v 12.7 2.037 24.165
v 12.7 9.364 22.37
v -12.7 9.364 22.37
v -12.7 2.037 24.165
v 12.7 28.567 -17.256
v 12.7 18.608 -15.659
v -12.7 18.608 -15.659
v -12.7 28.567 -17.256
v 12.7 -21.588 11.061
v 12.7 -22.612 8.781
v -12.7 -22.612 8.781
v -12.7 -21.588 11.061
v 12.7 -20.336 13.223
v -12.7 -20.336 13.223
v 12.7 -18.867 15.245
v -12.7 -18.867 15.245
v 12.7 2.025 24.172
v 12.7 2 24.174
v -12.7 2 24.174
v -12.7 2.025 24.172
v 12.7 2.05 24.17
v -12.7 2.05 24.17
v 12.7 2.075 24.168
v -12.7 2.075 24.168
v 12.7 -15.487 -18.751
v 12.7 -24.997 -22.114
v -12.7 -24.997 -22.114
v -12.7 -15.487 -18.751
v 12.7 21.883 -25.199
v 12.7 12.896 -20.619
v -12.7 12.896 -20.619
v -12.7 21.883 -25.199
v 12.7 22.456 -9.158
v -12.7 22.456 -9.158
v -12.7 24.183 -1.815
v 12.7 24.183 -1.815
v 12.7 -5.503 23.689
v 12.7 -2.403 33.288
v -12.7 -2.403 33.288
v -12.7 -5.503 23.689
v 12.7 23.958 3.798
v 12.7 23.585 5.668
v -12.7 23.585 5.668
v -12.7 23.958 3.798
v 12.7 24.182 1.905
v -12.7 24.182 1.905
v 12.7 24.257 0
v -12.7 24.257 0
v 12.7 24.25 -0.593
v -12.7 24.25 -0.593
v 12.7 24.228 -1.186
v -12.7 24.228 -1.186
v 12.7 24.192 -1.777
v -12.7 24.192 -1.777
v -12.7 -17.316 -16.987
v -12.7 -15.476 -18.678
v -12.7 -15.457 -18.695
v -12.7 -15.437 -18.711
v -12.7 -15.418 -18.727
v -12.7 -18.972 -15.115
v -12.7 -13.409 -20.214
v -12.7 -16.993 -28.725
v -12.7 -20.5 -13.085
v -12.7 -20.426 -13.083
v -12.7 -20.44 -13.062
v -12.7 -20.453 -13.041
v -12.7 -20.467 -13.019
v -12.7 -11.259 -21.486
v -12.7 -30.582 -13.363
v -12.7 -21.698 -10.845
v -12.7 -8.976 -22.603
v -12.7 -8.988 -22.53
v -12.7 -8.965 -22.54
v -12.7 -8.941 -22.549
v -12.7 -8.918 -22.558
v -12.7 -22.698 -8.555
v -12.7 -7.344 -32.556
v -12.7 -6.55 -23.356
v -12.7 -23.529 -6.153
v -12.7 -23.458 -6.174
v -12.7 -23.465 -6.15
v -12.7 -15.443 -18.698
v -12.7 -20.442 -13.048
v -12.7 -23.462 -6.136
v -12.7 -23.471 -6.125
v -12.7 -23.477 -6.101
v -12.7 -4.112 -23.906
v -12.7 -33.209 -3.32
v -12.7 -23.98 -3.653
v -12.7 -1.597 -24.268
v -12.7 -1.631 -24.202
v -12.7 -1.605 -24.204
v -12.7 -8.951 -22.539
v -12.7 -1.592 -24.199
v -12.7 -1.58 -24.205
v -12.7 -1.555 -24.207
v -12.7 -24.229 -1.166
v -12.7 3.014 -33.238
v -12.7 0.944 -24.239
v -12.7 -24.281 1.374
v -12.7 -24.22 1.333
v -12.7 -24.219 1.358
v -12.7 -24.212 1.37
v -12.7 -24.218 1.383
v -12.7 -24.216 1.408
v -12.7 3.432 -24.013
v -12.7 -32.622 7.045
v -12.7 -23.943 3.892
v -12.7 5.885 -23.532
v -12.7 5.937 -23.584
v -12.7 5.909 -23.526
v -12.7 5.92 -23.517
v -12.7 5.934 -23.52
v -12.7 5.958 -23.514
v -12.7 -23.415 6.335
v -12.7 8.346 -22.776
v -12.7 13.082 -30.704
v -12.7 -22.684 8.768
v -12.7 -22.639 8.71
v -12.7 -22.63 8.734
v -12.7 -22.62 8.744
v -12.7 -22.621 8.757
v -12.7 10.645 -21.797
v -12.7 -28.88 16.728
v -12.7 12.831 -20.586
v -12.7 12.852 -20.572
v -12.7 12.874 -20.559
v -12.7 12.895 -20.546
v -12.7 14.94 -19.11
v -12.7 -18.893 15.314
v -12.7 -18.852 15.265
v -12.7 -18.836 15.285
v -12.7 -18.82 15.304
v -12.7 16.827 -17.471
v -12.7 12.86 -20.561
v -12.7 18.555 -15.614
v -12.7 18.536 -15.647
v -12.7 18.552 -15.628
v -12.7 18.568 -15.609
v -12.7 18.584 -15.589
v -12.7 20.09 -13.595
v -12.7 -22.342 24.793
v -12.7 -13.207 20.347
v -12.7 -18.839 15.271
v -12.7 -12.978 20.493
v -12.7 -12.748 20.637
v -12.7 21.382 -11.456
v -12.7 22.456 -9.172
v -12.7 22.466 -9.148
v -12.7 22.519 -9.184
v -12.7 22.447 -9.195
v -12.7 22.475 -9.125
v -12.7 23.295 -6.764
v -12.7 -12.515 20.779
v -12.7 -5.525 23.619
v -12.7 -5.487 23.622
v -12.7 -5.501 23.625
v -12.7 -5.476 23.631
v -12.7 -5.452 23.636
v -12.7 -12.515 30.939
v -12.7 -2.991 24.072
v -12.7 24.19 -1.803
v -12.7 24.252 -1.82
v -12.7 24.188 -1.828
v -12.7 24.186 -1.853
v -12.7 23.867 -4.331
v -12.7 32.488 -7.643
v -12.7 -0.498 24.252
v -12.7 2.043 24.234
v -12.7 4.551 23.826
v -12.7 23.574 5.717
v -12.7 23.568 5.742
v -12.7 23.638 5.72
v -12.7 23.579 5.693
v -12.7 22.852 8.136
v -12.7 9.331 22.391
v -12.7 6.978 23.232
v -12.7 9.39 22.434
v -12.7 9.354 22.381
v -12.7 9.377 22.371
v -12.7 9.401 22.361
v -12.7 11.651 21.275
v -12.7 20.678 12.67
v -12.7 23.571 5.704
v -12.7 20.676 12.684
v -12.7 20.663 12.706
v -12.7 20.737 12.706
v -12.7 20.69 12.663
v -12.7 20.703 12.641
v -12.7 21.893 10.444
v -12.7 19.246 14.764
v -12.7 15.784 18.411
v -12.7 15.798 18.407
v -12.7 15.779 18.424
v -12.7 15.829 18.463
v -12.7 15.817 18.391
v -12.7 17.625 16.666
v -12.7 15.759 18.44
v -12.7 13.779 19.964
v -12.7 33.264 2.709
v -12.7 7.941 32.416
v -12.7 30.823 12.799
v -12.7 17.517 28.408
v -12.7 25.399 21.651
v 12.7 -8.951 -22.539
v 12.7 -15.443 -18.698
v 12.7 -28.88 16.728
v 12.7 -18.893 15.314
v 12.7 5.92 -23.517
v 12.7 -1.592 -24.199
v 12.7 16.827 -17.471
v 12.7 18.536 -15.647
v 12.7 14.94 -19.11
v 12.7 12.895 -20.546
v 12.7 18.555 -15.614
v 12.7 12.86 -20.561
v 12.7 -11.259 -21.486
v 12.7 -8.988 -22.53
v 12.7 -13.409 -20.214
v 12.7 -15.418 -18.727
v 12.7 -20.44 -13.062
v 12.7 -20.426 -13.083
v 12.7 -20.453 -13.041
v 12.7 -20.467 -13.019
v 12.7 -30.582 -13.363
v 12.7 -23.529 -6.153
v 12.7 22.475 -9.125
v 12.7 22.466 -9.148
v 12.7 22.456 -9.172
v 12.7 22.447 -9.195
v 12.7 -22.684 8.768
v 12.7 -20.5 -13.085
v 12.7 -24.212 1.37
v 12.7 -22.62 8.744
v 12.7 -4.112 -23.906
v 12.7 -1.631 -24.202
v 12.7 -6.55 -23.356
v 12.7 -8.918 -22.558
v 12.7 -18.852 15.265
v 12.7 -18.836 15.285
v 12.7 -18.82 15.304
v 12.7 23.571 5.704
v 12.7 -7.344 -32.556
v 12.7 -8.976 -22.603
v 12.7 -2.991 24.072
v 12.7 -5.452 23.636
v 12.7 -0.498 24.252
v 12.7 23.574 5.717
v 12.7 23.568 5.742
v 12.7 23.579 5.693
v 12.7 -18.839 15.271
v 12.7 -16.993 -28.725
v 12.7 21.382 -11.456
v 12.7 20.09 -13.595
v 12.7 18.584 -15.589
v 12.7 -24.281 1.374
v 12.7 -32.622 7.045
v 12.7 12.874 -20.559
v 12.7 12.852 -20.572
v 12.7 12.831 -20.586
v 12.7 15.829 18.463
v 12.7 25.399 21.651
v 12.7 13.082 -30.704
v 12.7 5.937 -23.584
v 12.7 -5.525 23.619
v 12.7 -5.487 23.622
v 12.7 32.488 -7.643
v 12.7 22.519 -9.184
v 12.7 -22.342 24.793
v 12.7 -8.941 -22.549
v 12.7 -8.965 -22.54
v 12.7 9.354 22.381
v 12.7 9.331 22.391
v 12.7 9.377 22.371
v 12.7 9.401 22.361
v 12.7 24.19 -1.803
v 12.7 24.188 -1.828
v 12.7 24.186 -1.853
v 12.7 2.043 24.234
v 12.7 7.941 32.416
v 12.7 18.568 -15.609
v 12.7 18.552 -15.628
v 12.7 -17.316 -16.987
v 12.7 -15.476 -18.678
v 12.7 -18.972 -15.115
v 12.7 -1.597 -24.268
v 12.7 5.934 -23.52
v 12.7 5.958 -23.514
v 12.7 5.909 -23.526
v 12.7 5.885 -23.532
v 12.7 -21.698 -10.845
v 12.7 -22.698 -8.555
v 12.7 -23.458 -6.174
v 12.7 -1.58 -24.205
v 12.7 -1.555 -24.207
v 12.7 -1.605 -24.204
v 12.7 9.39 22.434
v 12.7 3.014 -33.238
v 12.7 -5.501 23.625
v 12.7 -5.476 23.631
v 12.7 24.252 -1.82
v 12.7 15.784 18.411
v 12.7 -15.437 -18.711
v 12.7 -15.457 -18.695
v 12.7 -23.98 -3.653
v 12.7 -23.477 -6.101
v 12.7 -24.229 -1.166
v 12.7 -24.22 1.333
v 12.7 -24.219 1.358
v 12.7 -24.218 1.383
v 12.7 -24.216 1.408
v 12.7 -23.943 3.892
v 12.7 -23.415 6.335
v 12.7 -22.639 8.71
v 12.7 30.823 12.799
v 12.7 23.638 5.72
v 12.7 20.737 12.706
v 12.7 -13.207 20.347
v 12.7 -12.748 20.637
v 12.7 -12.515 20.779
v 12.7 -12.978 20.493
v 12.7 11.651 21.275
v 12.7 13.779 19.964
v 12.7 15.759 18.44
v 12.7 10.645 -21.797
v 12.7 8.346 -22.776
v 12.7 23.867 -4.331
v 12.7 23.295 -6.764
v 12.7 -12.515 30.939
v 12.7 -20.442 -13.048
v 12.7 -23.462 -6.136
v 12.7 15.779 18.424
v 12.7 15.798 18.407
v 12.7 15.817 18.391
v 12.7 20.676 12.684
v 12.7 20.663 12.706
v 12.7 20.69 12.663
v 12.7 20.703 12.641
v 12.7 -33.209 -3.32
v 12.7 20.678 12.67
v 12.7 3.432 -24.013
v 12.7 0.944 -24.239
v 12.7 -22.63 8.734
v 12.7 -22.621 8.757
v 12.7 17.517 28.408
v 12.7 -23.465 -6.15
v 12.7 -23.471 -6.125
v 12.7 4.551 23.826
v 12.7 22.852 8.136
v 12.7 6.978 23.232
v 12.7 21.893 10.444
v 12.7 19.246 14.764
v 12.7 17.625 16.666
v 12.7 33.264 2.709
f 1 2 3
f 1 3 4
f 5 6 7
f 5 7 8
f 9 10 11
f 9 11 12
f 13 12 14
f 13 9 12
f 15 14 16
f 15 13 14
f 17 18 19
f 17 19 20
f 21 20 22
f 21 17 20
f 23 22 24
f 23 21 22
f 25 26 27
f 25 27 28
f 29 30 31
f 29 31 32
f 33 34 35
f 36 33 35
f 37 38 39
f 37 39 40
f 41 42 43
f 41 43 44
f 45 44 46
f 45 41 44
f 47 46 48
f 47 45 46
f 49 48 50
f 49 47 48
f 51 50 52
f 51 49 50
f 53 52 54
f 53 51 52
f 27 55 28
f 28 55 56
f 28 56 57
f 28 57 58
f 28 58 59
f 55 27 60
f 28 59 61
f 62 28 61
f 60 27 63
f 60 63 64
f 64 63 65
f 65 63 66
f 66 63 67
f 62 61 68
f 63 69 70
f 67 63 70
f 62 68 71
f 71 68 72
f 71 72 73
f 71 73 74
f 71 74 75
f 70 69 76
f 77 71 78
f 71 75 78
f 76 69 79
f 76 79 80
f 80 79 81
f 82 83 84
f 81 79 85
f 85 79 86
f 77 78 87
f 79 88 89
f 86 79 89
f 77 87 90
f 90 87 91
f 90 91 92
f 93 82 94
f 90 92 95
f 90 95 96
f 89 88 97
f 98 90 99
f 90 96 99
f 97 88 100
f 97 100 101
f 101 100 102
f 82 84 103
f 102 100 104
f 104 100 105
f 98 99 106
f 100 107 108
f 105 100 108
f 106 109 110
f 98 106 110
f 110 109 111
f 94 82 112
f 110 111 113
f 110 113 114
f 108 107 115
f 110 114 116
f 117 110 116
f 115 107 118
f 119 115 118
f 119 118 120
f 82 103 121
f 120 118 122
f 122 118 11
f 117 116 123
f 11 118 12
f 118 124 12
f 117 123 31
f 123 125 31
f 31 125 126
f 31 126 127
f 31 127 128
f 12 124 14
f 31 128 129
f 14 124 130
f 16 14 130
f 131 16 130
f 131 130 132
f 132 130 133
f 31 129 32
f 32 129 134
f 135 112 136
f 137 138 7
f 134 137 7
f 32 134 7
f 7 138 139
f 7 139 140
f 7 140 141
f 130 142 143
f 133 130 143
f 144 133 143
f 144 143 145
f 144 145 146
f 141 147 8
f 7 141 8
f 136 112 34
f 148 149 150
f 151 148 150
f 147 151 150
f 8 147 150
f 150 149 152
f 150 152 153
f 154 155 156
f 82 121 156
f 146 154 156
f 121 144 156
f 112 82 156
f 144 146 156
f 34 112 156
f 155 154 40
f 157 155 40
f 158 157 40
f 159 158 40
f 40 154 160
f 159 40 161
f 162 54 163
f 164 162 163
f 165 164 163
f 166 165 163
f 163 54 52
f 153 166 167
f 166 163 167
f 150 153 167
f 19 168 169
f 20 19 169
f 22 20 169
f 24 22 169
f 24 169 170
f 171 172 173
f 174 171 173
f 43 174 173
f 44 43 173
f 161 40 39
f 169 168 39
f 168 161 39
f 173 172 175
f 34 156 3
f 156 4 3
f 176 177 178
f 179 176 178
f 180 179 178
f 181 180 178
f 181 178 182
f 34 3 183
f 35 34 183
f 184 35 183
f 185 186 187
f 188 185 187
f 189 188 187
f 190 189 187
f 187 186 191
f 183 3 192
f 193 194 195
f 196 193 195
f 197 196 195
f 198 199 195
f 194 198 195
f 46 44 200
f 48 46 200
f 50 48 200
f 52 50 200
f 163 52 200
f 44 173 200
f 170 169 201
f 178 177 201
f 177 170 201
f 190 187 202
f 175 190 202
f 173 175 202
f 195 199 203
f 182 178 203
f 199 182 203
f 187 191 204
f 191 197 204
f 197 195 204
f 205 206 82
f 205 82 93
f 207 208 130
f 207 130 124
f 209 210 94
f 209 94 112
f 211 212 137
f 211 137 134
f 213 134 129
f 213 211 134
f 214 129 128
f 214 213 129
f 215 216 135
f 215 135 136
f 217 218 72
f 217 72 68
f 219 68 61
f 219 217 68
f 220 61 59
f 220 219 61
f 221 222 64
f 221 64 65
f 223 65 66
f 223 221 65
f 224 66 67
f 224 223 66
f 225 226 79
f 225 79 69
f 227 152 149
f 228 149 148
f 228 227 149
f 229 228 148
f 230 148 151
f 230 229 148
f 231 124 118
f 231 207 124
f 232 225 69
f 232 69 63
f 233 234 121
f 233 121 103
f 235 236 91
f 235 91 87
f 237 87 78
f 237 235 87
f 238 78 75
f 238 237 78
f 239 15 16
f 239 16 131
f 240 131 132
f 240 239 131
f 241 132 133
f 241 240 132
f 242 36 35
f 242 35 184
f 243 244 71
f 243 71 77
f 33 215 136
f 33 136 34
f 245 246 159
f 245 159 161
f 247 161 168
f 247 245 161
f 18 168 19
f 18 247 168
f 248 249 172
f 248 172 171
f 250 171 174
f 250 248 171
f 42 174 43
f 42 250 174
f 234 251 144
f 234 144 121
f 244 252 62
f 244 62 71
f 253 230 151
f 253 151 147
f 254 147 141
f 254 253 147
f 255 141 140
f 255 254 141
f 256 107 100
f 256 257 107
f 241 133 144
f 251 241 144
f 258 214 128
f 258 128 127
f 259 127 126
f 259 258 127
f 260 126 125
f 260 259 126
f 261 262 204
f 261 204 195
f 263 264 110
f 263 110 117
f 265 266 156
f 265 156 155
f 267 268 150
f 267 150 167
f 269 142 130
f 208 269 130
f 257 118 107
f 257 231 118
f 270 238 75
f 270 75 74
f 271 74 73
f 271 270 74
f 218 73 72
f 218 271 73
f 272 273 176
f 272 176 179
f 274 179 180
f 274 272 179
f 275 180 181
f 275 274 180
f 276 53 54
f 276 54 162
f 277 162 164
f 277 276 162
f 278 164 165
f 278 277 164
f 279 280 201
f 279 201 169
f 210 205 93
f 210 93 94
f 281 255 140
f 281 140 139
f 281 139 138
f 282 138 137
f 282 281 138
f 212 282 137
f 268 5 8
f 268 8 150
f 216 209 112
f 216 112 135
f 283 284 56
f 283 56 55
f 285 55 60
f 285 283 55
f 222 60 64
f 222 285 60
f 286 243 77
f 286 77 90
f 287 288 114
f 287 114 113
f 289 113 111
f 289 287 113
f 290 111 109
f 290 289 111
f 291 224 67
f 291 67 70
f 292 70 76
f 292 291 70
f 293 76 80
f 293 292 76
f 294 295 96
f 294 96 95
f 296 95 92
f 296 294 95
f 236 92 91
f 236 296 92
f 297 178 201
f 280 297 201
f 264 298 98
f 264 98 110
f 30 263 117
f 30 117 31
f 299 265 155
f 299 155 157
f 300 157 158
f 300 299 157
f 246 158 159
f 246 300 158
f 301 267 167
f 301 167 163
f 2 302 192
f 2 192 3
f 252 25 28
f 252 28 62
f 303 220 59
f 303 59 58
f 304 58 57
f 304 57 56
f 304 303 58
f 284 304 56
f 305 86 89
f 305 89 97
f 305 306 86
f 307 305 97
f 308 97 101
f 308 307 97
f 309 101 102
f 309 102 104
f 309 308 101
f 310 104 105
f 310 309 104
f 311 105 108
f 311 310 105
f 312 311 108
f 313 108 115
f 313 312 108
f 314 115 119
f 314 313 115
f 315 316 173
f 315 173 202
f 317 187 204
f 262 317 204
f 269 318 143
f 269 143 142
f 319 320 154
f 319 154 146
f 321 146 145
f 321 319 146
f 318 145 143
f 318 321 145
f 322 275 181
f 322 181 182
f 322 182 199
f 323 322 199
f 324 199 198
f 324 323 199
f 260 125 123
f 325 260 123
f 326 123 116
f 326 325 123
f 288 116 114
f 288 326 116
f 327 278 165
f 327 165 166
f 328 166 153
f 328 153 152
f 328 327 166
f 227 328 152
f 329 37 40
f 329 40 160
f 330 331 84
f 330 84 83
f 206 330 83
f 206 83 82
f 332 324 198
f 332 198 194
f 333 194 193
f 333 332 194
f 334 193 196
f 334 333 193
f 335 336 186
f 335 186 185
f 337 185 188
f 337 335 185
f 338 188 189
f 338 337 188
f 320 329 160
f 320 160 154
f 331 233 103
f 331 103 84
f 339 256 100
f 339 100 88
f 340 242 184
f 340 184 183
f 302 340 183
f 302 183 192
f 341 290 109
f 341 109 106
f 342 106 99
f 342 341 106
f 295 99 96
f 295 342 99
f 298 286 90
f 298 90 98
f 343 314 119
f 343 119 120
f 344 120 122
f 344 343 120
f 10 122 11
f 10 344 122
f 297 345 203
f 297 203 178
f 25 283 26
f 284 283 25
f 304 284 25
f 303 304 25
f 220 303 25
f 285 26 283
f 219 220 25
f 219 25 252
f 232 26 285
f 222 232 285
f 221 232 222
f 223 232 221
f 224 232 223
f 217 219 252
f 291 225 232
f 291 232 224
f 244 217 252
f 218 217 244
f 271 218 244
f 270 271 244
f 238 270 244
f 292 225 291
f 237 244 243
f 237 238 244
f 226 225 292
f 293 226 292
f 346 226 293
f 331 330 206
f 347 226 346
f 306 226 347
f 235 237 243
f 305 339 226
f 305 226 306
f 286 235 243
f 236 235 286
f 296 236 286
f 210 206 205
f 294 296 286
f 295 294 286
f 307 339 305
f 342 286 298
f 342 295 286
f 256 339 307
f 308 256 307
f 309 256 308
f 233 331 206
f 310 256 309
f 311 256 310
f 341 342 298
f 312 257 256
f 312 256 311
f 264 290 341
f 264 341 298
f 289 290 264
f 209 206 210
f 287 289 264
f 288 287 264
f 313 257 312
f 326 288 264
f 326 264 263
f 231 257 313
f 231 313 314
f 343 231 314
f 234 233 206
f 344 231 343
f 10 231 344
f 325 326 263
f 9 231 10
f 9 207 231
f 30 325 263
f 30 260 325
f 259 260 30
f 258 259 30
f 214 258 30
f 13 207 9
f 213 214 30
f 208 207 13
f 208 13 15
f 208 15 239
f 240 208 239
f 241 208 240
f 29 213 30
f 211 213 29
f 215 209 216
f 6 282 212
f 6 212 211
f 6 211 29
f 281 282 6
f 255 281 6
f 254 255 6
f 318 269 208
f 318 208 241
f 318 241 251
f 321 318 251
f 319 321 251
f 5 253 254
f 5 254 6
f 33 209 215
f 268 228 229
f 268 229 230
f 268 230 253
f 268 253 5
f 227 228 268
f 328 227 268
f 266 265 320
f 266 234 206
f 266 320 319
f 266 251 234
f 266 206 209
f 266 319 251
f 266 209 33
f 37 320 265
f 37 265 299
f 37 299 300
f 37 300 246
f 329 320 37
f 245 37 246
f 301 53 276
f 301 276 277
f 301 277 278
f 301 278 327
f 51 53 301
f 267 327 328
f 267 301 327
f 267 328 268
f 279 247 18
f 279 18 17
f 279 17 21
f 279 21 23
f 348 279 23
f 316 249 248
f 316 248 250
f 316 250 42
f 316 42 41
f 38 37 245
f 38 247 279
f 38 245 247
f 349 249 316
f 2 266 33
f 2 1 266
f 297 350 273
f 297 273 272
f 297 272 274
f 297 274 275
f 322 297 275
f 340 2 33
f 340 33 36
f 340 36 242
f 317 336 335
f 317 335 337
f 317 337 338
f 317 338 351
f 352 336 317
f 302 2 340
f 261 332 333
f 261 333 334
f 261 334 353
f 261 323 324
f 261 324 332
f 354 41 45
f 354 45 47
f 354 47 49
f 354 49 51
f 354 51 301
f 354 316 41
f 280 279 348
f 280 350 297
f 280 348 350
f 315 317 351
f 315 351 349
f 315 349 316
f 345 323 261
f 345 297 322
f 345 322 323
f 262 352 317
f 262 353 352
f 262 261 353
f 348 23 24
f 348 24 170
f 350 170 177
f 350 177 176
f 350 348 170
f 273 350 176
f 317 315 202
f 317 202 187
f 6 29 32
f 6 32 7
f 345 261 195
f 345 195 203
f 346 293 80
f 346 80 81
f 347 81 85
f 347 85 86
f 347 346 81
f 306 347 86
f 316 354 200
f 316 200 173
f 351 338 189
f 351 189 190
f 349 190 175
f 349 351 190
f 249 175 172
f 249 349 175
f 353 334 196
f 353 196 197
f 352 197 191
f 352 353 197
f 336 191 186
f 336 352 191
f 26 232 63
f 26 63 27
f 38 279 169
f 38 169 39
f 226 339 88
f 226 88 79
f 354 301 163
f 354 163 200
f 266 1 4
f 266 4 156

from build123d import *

# Parameters (mm, degrees)
F1_DEPTH = 12.7


with BuildPart() as f1:
    # F0 (on Right) → F1 (new body, symmetric)
    with BuildSketch(Plane.YZ):
        with BuildLine():
            ThreePointArc((23.5854054871, 5.6683945708), (24.0885162463, 2.8540206814), (24.257, 0))
            ThreePointArc((24.257, 0), (24.2406926461, -0.8893081786), (24.1917925105, -1.7774206395))
            Line((24.1917925105, -1.7774206395), (24.2518372175, -1.8198767227))
            Line((24.2518372175, -1.8198767227), (33.2643587406, 2.7090486284))
            Line((33.2643587406, 2.7090486284), (23.6377892706, 5.7200068277))
            Line((23.6377892706, 5.7200068277), (23.5854054871, 5.6683945708))
        make_face()
        with BuildLine():
            ThreePointArc((23.5676039215, 5.7419591081), (23.5765333967, 5.7051837826), (23.5854054871, 5.6683945708))
            Line((23.5854054871, 5.6683945708), (23.6377892706, 5.7200068277))
            Line((23.6377892706, 5.7200068277), (23.5676039215, 5.7419591081))
        make_face()
        with BuildLine():
            Line((24.2518372175, -1.8198767227), (24.1917925105, -1.7774206395))
            ThreePointArc((24.1917925105, -1.7774206395), (24.1889900762, -1.8151606243), (24.1861287664, -1.8528961911))
            Line((24.1861287664, -1.8528961911), (24.2518372175, -1.8198767227))
        make_face()
        with BuildLine():
            ThreePointArc((20.7026825957, 12.6412413291), (22.402334496, 9.3025511624), (23.5676039215, 5.7419591081))
            Line((23.5676039215, 5.7419591081), (23.6377892706, 5.7200068277))
            Line((23.6377892706, 5.7200068277), (30.8227094509, 12.7991050077))
            Line((30.8227094509, 12.7991050077), (20.7366733326, 12.7064526444))
            Line((20.7366733326, 12.7064526444), (20.7026825957, 12.6412413291))
        make_face()
        with BuildLine():
            Line((24.1830190921, -1.814712557), (23.5707135958, 5.7037754741))
            Line((23.5707135958, 5.7037754741), (20.6778299975, 12.6703962317))
            Line((20.6778299975, 12.6703962317), (15.7842684775, 18.4110961842))
            Line((15.7842684775, 18.4110961842), (9.3635042744, 22.37043544))
            Line((9.3635042744, 22.37043544), (2.0367767147, 24.1653291864))
            Line((2.0367767147, 24.1653291864), (-5.4870186323, 23.622112958))
            Line((-5.4870186323, 23.622112958), (-12.5154333238, 20.778979227))
            ThreePointArc((-12.5154333238, 20.778979227), (-12.8629795573, 20.5656462556), (-13.2068903428, 20.346500841))
            Line((-13.2068903428, 20.346500841), (-18.839030758, 15.270969654))
            Line((-18.839030758, 15.270969654), (-22.6199467454, 8.7435463805))
            Line((-22.6199467454, 8.7435463805), (-24.2122758236, 1.370143611))
            Line((-24.2122758236, 1.370143611), (-23.4619526177, -6.1358270378))
            Line((-23.4619526177, -6.1358270378), (-20.4415744492, -13.0481273795))
            Line((-20.4415744492, -13.0481273795), (-15.4433772015, -18.6979596396))
            Line((-15.4433772015, -18.6979596396), (-8.9509601151, -22.5386758061))
            Line((-8.9509601151, -22.5386758061), (-1.5924952722, -24.1986684113))
            Line((-1.5924952722, -24.1986684113), (5.9200510257, -23.517325314))
            Line((5.9200510257, -23.517325314), (12.859804367, -20.5605696837))
            Line((12.859804367, -20.5605696837), (18.5553107694, -15.614481622))
            Line((18.5553107694, -15.614481622), (22.4555030315, -9.1576185591))
            Line((22.4555030315, -9.1576185591), (24.1830190921, -1.814712557))
        make_face()
        with BuildLine():
            Line((24.2518372175, -1.8198767227), (24.1861287664, -1.8528961911))
            ThreePointArc((24.1861287664, -1.8528961911), (23.6123426483, -5.5551168898), (22.4753106729, -9.1248265276))
            Line((22.4753106729, -9.1248265276), (22.5194051282, -9.1836785866))
            Line((22.5194051282, -9.1836785866), (32.4875238799, -7.6431210279))
            Line((32.4875238799, -7.6431210279), (24.2518372175, -1.8198767227))
        make_face()
        with BuildLine():
            ThreePointArc((20.6631381062, 12.705777135), (20.6829355219, 12.6735246556), (20.7026825957, 12.6412413291))
            Line((20.7026825957, 12.6412413291), (20.7366733326, 12.7064526444))
            Line((20.7366733326, 12.7064526444), (20.6631381062, 12.705777135))
        make_face()
        with BuildLine():
            Line((22.5194051282, -9.1836785866), (22.4753106729, -9.1248265276))
            ThreePointArc((22.4753106729, -9.1248265276), (22.4610474779, -9.1598796496), (22.4467296132, -9.1949104766))
            Line((22.4467296132, -9.1949104766), (22.5194051282, -9.1836785866))
        make_face()
        with BuildLine():
            ThreePointArc((15.8168771762, 18.3909881571), (18.460181062, 15.7360657141), (20.6631381062, 12.705777135))
            Line((20.6631381062, 12.705777135), (20.7366733326, 12.7064526444))
            Line((20.7366733326, 12.7064526444), (25.3988171361, 21.6507873986))
            Line((25.3988171361, 21.6507873986), (15.8291861018, 18.4634890273))
            Line((15.8291861018, 18.4634890273), (15.8168771762, 18.3909881571))
        make_face()
        with BuildLine():
            Line((22.5194051282, -9.1836785866), (22.4467296132, -9.1949104766))
            ThreePointArc((22.4467296132, -9.1949104766), (20.7631233508, -12.5417206841), (18.5842361506, -15.5893622608))
            Line((18.5842361506, -15.5893622608), (18.608114007, -15.6589160803))
            Line((18.608114007, -15.6589160803), (28.5673673184, -17.2557825493))
            Line((28.5673673184, -17.2557825493), (22.5194051282, -9.1836785866))
        make_face()
        with BuildLine():
            ThreePointArc((15.7594158792, 18.4402510868), (15.7881657418, 18.4156420336), (15.8168771762, 18.3909881571))
            Line((15.8168771762, 18.3909881571), (15.8291861018, 18.4634890273))
            Line((15.8291861018, 18.4634890273), (15.7594158792, 18.4402510868))
        make_face()
        with BuildLine():
            ThreePointArc((9.4007140276, 22.3613198352), (12.7319177371, 20.6470414282), (15.7594158792, 18.4402510868))
            Line((15.7594158792, 18.4402510868), (15.8291861018, 18.4634890273))
            Line((15.8291861018, 18.4634890273), (17.5174690492, 28.4076536343))
            Line((17.5174690492, 28.4076536343), (9.3901501952, 22.4340954581))
            Line((9.3901501952, 22.4340954581), (9.4007140276, 22.3613198352))
        make_face()
        with BuildLine():
            Line((18.608114007, -15.6589160803), (18.5842361506, -15.5893622608))
            ThreePointArc((18.5842361506, -15.5893622608), (18.5598922266, -15.6183369645), (18.5355031281, -15.6472736535))
            Line((18.5355031281, -15.6472736535), (18.608114007, -15.6589160803))
        make_face()
        with BuildLine():
            Line((18.608114007, -15.6589160803), (18.5355031281, -15.6472736535))
            ThreePointArc((18.5355031281, -15.6472736535), (15.9049735961, -18.3148536415), (12.8950488205, -20.5455534099))
            Line((12.8950488205, -20.5455534099), (12.8963997824, -20.6190793287))
            Line((12.8963997824, -20.6190793287), (21.8831827577, -25.1988654365))
            Line((21.8831827577, -25.1988654365), (18.608114007, -15.6589160803))
        make_face()
        with BuildLine():
            ThreePointArc((9.3308955757, 22.3905434672), (9.3658161997, 22.3759588825), (9.4007140276, 22.3613198352))
            Line((9.4007140276, 22.3613198352), (9.3901501952, 22.4340954581))
            Line((9.3901501952, 22.4340954581), (9.3308955757, 22.3905434672))
        make_face()
        with BuildLine():
            ThreePointArc((2.0749873027, 24.1680879818), (5.7717811102, 23.5603181603), (9.3308955757, 22.3905434672))
            Line((9.3308955757, 22.3905434672), (9.3901501952, 22.4340954581))
            Line((9.3901501952, 22.4340954581), (7.9412229206, 32.4159449256))
            Line((7.9412229206, 32.4159449256), (2.042572813, 24.2340969713))
            Line((2.042572813, 24.2340969713), (2.0749873027, 24.1680879818))
        make_face()
        with BuildLine():
            Line((12.8963997824, -20.6190793287), (12.8950488205, -20.5455534099))
            ThreePointArc((12.8950488205, -20.5455534099), (12.8629795573, -20.5656462556), (12.8308789858, -20.5856890449))
            Line((12.8308789858, -20.5856890449), (12.8963997824, -20.6190793287))
        make_face()
        with BuildLine():
            Line((12.8963997824, -20.6190793287), (12.8308789858, -20.5856890449))
            ThreePointArc((12.8308789858, -20.5856890449), (9.5079423667, -22.3159378237), (5.9582044839, -23.5138650232))
            Line((5.9582044839, -23.5138650232), (5.9368978393, -23.5842490607))
            Line((5.9368978393, -23.5842490607), (13.0816966908, -30.7038388248))
            Line((13.0816966908, -30.7038388248), (12.8963997824, -20.6190793287))
        make_face()
        with BuildLine():
            ThreePointArc((1.9995669615, 24.1744447913), (2.0372796114, 24.1712958028), (2.0749873027, 24.1680879818))
            Line((2.0749873027, 24.1680879818), (2.042572813, 24.2340969713))
            Line((2.042572813, 24.2340969713), (1.9995669615, 24.1744447913))
        make_face()
        with BuildLine():
            Line((-12.5154333238, 20.778979227), (-5.4870186323, 23.622112958))
            Line((-5.4870186323, 23.622112958), (-5.5252292203, 23.6193541627))
            ThreePointArc((-5.5252292203, 23.6193541627), (-9.1314461451, 22.4726220166), (-12.5154333238, 20.778979227))
        make_face()
        with BuildLine():
            ThreePointArc((-5.4515042648, 23.636479227), (-1.7468026573, 24.1940225981), (1.9995669615, 24.1744447913))
            Line((1.9995669615, 24.1744447913), (2.042572813, 24.2340969713))
            Line((2.042572813, 24.2340969713), (-2.4033741119, 33.2878401188))
            Line((-2.4033741119, 33.2878401188), (-5.5026331565, 23.689334901))
            Line((-5.5026331565, 23.689334901), (-5.4515042648, 23.636479227))
        make_face()
        with BuildLine():
            Line((5.9368978393, -23.5842490607), (5.9582044839, -23.5138650232))
            ThreePointArc((5.9582044839, -23.5138650232), (5.9215127345, -23.523131933), (5.8848065722, -23.5323415879))
            Line((5.8848065722, -23.5323415879), (5.9368978393, -23.5842490607))
        make_face()
        with BuildLine():
            Line((5.9368978393, -23.5842490607), (5.8848065722, -23.5323415879))
            ThreePointArc((5.8848065722, -23.5323415879), (2.1909727116, -24.1578493988), (-1.555124337, -24.2070989029))
            Line((-1.555124337, -24.2070989029), (-1.5970270694, -24.2675310703))
            Line((-1.5970270694, -24.2675310703), (3.0144945526, -33.2380704838))
            Line((3.0144945526, -33.2380704838), (5.9368978393, -23.5842490607))
        make_face()
        with BuildLine():
            ThreePointArc((-5.5252292203, 23.6193541627), (-5.4883734219, 23.6279454499), (-5.4515042648, 23.636479227))
            Line((-5.4515042648, 23.636479227), (-5.5026331565, 23.689334901))
            Line((-5.5026331565, 23.689334901), (-5.5252292203, 23.6193541627))
        make_face()
        with BuildLine():
            Line((-12.5154333238, 30.938979227), (-12.5154333238, 20.778979227))
            ThreePointArc((-12.5154333238, 20.778979227), (-9.1314461451, 22.4726220166), (-5.5252292203, 23.6193541627))
            Line((-5.5252292203, 23.6193541627), (-5.5026331565, 23.689334901))
            Line((-5.5026331565, 23.689334901), (-12.5154333238, 30.938979227))
        make_face()
        with BuildLine():
            Line((-1.5970270694, -24.2675310703), (-1.555124337, -24.2070989029))
            ThreePointArc((-1.555124337, -24.2070989029), (-1.5928884722, -24.2046432594), (-1.6306487304, -24.2021287022))
            Line((-1.6306487304, -24.2021287022), (-1.5970270694, -24.2675310703))
        make_face()
        with BuildLine():
            Line((-1.5970270694, -24.2675310703), (-1.6306487304, -24.2021287022))
            ThreePointArc((-1.6306487304, -24.2021287022), (-5.3379839233, -23.662374704), (-8.9179875178, -22.5581813902))
            Line((-8.9179875178, -22.5581813902), (-8.9764320503, -22.6028145892))
            Line((-8.9764320503, -22.6028145892), (-7.3443742013, -32.5563615056))
            Line((-7.3443742013, -32.5563615056), (-1.5970270694, -24.2675310703))
        make_face()
        with BuildLine():
            Line((-18.839030758, 15.270969654), (-13.2068903428, 20.346500841))
            ThreePointArc((-13.2068903428, 20.346500841), (-16.2106164918, 18.0448874188), (-18.819828877, 15.3041200348))
            Line((-18.819828877, 15.3041200348), (-18.839030758, 15.270969654))
        make_face()
        with BuildLine():
            ThreePointArc((-18.819828877, 15.3041200348), (-16.2106164918, 18.0448874188), (-13.2068903428, 20.346500841))
            Line((-13.2068903428, 20.346500841), (-22.3424144499, 24.7926001751))
            Line((-22.3424144499, 24.7926001751), (-18.8926413835, 15.3144265731))
            Line((-18.8926413835, 15.3144265731), (-18.819828877, 15.3041200348))
        make_face()
        with BuildLine():
            Line((-8.9764320503, -22.6028145892), (-8.9179875178, -22.5581813902))
            ThreePointArc((-8.9179875178, -22.5581813902), (-8.95317018, -22.5442407885), (-8.9883310503, -22.5302453145))
            Line((-8.9883310503, -22.5302453145), (-8.9764320503, -22.6028145892))
        make_face()
        with BuildLine():
            Line((-8.9764320503, -22.6028145892), (-8.9883310503, -22.5302453145))
            ThreePointArc((-8.9883310503, -22.5302453145), (-12.3504653486, -20.8774532612), (-15.4179931969, -18.7266530587))
            Line((-15.4179931969, -18.7266530587), (-15.4873247444, -18.7511688161))
            Line((-15.4873247444, -18.7511688161), (-16.9926399899, -28.7246704605))
            Line((-16.9926399899, -28.7246704605), (-8.9764320503, -22.6028145892))
        make_face()
        with BuildLine():
            ThreePointArc((-18.8674897937, 15.2453231479), (-18.8436822679, 15.2747401806), (-18.819828877, 15.3041200348))
            Line((-18.819828877, 15.3041200348), (-18.8926413835, 15.3144265731))
            Line((-18.8926413835, 15.3144265731), (-18.8674897937, 15.2453231479))
        make_face()
        with BuildLine():
            Line((-15.4873247444, -18.7511688161), (-15.4179931969, -18.7266530587))
            ThreePointArc((-15.4179931969, -18.7266530587), (-15.447190297, -18.702576318), (-15.4763497988, -18.6784540555))
            Line((-15.4763497988, -18.6784540555), (-15.4873247444, -18.7511688161))
        make_face()
        with BuildLine():
            Line((-15.4873247444, -18.7511688161), (-15.4763497988, -18.6784540555))
            ThreePointArc((-15.4763497988, -18.6784540555), (-18.167980796, -16.072539401), (-20.4262350599, -13.0832324093))
            Line((-20.4262350599, -13.0832324093), (-20.499745467, -13.0852587096))
            Line((-20.499745467, -13.0852587096), (-24.9967874323, -22.1137315928))
            Line((-24.9967874323, -22.1137315928), (-15.4873247444, -18.7511688161))
        make_face()
        with BuildLine():
            ThreePointArc((-22.611859892, 8.7809931799), (-20.9900215119, 12.158167869), (-18.8674897937, 15.2453231479))
            Line((-18.8674897937, 15.2453231479), (-18.8926413835, 15.3144265731))
            Line((-18.8926413835, 15.3144265731), (-28.8795497873, 16.7280635752))
            Line((-28.8795497873, 16.7280635752), (-22.684316803, 8.7684280741))
            Line((-22.684316803, 8.7684280741), (-22.611859892, 8.7809931799))
        make_face()
        with BuildLine():
            Line((-20.499745467, -13.0852587096), (-20.4262350599, -13.0832324093))
            ThreePointArc((-20.4262350599, -13.0832324093), (-20.4466216402, -13.0513490683), (-20.4669584538, -13.0194339605))
            Line((-20.4669584538, -13.0194339605), (-20.499745467, -13.0852587096))
        make_face()
        with BuildLine():
            Line((-20.499745467, -13.0852587096), (-20.4669584538, -13.0194339605))
            ThreePointArc((-20.4669584538, -13.0194339605), (-22.2276581111, -9.7125312815), (-23.4581420023, -6.1739471007))
            Line((-23.4581420023, -6.1739471007), (-23.5287187891, -6.1532878897))
            Line((-23.5287187891, -6.1532878897), (-30.5823773793, -13.3631845278))
            Line((-30.5823773793, -13.3631845278), (-20.499745467, -13.0852587096))
        make_face()
        with BuildLine():
            ThreePointArc((-22.6391486264, 8.7103959997), (-22.6255317943, 8.7457052333), (-22.611859892, 8.7809931799))
            Line((-22.611859892, 8.7809931799), (-22.684316803, 8.7684280741))
            Line((-22.684316803, 8.7684280741), (-22.6391486264, 8.7103959997))
        make_face()
        with BuildLine():
            ThreePointArc((-24.2160864391, 1.4082636739), (-23.7104101058, 5.1204005326), (-22.6391486264, 8.7103959997))
            Line((-22.6391486264, 8.7103959997), (-22.684316803, 8.7684280741))
            Line((-22.684316803, 8.7684280741), (-32.6224519942, 7.0450076493))
            Line((-32.6224519942, 7.0450076493), (-24.2811772055, 1.3740426575))
            Line((-24.2811772055, 1.3740426575), (-24.2160864391, 1.4082636739))
        make_face()
        with BuildLine():
            Line((-23.5287187891, -6.1532878897), (-23.4581420023, -6.1739471007))
            ThreePointArc((-23.4581420023, -6.1739471007), (-23.4677455647, -6.1373420234), (-23.477292007, -6.1007220079))
            Line((-23.477292007, -6.1007220079), (-23.5287187891, -6.1532878897))
        make_face()
        with BuildLine():
            Line((-23.5287187891, -6.1532878897), (-23.477292007, -6.1007220079))
            ThreePointArc((-23.477292007, -6.1007220079), (-24.1367042992, -2.4127897905), (-24.2203626771, 1.3326968116))
            Line((-24.2203626771, 1.3326968116), (-24.2811772055, 1.3740426575))
            Line((-24.2811772055, 1.3740426575), (-33.2089775666, -3.319686111))
            Line((-33.2089775666, -3.319686111), (-23.5287187891, -6.1532878897))
        make_face()
        with BuildLine():
            ThreePointArc((-24.2203626771, 1.3326968116), (-24.2182540315, 1.3704819106), (-24.2160864391, 1.4082636739))
            Line((-24.2160864391, 1.4082636739), (-24.2811772055, 1.3740426575))
            Line((-24.2811772055, 1.3740426575), (-24.2203626771, 1.3326968116))
        make_face()
    extrude(amount=F1_DEPTH, both=True)


solid = f1.part
